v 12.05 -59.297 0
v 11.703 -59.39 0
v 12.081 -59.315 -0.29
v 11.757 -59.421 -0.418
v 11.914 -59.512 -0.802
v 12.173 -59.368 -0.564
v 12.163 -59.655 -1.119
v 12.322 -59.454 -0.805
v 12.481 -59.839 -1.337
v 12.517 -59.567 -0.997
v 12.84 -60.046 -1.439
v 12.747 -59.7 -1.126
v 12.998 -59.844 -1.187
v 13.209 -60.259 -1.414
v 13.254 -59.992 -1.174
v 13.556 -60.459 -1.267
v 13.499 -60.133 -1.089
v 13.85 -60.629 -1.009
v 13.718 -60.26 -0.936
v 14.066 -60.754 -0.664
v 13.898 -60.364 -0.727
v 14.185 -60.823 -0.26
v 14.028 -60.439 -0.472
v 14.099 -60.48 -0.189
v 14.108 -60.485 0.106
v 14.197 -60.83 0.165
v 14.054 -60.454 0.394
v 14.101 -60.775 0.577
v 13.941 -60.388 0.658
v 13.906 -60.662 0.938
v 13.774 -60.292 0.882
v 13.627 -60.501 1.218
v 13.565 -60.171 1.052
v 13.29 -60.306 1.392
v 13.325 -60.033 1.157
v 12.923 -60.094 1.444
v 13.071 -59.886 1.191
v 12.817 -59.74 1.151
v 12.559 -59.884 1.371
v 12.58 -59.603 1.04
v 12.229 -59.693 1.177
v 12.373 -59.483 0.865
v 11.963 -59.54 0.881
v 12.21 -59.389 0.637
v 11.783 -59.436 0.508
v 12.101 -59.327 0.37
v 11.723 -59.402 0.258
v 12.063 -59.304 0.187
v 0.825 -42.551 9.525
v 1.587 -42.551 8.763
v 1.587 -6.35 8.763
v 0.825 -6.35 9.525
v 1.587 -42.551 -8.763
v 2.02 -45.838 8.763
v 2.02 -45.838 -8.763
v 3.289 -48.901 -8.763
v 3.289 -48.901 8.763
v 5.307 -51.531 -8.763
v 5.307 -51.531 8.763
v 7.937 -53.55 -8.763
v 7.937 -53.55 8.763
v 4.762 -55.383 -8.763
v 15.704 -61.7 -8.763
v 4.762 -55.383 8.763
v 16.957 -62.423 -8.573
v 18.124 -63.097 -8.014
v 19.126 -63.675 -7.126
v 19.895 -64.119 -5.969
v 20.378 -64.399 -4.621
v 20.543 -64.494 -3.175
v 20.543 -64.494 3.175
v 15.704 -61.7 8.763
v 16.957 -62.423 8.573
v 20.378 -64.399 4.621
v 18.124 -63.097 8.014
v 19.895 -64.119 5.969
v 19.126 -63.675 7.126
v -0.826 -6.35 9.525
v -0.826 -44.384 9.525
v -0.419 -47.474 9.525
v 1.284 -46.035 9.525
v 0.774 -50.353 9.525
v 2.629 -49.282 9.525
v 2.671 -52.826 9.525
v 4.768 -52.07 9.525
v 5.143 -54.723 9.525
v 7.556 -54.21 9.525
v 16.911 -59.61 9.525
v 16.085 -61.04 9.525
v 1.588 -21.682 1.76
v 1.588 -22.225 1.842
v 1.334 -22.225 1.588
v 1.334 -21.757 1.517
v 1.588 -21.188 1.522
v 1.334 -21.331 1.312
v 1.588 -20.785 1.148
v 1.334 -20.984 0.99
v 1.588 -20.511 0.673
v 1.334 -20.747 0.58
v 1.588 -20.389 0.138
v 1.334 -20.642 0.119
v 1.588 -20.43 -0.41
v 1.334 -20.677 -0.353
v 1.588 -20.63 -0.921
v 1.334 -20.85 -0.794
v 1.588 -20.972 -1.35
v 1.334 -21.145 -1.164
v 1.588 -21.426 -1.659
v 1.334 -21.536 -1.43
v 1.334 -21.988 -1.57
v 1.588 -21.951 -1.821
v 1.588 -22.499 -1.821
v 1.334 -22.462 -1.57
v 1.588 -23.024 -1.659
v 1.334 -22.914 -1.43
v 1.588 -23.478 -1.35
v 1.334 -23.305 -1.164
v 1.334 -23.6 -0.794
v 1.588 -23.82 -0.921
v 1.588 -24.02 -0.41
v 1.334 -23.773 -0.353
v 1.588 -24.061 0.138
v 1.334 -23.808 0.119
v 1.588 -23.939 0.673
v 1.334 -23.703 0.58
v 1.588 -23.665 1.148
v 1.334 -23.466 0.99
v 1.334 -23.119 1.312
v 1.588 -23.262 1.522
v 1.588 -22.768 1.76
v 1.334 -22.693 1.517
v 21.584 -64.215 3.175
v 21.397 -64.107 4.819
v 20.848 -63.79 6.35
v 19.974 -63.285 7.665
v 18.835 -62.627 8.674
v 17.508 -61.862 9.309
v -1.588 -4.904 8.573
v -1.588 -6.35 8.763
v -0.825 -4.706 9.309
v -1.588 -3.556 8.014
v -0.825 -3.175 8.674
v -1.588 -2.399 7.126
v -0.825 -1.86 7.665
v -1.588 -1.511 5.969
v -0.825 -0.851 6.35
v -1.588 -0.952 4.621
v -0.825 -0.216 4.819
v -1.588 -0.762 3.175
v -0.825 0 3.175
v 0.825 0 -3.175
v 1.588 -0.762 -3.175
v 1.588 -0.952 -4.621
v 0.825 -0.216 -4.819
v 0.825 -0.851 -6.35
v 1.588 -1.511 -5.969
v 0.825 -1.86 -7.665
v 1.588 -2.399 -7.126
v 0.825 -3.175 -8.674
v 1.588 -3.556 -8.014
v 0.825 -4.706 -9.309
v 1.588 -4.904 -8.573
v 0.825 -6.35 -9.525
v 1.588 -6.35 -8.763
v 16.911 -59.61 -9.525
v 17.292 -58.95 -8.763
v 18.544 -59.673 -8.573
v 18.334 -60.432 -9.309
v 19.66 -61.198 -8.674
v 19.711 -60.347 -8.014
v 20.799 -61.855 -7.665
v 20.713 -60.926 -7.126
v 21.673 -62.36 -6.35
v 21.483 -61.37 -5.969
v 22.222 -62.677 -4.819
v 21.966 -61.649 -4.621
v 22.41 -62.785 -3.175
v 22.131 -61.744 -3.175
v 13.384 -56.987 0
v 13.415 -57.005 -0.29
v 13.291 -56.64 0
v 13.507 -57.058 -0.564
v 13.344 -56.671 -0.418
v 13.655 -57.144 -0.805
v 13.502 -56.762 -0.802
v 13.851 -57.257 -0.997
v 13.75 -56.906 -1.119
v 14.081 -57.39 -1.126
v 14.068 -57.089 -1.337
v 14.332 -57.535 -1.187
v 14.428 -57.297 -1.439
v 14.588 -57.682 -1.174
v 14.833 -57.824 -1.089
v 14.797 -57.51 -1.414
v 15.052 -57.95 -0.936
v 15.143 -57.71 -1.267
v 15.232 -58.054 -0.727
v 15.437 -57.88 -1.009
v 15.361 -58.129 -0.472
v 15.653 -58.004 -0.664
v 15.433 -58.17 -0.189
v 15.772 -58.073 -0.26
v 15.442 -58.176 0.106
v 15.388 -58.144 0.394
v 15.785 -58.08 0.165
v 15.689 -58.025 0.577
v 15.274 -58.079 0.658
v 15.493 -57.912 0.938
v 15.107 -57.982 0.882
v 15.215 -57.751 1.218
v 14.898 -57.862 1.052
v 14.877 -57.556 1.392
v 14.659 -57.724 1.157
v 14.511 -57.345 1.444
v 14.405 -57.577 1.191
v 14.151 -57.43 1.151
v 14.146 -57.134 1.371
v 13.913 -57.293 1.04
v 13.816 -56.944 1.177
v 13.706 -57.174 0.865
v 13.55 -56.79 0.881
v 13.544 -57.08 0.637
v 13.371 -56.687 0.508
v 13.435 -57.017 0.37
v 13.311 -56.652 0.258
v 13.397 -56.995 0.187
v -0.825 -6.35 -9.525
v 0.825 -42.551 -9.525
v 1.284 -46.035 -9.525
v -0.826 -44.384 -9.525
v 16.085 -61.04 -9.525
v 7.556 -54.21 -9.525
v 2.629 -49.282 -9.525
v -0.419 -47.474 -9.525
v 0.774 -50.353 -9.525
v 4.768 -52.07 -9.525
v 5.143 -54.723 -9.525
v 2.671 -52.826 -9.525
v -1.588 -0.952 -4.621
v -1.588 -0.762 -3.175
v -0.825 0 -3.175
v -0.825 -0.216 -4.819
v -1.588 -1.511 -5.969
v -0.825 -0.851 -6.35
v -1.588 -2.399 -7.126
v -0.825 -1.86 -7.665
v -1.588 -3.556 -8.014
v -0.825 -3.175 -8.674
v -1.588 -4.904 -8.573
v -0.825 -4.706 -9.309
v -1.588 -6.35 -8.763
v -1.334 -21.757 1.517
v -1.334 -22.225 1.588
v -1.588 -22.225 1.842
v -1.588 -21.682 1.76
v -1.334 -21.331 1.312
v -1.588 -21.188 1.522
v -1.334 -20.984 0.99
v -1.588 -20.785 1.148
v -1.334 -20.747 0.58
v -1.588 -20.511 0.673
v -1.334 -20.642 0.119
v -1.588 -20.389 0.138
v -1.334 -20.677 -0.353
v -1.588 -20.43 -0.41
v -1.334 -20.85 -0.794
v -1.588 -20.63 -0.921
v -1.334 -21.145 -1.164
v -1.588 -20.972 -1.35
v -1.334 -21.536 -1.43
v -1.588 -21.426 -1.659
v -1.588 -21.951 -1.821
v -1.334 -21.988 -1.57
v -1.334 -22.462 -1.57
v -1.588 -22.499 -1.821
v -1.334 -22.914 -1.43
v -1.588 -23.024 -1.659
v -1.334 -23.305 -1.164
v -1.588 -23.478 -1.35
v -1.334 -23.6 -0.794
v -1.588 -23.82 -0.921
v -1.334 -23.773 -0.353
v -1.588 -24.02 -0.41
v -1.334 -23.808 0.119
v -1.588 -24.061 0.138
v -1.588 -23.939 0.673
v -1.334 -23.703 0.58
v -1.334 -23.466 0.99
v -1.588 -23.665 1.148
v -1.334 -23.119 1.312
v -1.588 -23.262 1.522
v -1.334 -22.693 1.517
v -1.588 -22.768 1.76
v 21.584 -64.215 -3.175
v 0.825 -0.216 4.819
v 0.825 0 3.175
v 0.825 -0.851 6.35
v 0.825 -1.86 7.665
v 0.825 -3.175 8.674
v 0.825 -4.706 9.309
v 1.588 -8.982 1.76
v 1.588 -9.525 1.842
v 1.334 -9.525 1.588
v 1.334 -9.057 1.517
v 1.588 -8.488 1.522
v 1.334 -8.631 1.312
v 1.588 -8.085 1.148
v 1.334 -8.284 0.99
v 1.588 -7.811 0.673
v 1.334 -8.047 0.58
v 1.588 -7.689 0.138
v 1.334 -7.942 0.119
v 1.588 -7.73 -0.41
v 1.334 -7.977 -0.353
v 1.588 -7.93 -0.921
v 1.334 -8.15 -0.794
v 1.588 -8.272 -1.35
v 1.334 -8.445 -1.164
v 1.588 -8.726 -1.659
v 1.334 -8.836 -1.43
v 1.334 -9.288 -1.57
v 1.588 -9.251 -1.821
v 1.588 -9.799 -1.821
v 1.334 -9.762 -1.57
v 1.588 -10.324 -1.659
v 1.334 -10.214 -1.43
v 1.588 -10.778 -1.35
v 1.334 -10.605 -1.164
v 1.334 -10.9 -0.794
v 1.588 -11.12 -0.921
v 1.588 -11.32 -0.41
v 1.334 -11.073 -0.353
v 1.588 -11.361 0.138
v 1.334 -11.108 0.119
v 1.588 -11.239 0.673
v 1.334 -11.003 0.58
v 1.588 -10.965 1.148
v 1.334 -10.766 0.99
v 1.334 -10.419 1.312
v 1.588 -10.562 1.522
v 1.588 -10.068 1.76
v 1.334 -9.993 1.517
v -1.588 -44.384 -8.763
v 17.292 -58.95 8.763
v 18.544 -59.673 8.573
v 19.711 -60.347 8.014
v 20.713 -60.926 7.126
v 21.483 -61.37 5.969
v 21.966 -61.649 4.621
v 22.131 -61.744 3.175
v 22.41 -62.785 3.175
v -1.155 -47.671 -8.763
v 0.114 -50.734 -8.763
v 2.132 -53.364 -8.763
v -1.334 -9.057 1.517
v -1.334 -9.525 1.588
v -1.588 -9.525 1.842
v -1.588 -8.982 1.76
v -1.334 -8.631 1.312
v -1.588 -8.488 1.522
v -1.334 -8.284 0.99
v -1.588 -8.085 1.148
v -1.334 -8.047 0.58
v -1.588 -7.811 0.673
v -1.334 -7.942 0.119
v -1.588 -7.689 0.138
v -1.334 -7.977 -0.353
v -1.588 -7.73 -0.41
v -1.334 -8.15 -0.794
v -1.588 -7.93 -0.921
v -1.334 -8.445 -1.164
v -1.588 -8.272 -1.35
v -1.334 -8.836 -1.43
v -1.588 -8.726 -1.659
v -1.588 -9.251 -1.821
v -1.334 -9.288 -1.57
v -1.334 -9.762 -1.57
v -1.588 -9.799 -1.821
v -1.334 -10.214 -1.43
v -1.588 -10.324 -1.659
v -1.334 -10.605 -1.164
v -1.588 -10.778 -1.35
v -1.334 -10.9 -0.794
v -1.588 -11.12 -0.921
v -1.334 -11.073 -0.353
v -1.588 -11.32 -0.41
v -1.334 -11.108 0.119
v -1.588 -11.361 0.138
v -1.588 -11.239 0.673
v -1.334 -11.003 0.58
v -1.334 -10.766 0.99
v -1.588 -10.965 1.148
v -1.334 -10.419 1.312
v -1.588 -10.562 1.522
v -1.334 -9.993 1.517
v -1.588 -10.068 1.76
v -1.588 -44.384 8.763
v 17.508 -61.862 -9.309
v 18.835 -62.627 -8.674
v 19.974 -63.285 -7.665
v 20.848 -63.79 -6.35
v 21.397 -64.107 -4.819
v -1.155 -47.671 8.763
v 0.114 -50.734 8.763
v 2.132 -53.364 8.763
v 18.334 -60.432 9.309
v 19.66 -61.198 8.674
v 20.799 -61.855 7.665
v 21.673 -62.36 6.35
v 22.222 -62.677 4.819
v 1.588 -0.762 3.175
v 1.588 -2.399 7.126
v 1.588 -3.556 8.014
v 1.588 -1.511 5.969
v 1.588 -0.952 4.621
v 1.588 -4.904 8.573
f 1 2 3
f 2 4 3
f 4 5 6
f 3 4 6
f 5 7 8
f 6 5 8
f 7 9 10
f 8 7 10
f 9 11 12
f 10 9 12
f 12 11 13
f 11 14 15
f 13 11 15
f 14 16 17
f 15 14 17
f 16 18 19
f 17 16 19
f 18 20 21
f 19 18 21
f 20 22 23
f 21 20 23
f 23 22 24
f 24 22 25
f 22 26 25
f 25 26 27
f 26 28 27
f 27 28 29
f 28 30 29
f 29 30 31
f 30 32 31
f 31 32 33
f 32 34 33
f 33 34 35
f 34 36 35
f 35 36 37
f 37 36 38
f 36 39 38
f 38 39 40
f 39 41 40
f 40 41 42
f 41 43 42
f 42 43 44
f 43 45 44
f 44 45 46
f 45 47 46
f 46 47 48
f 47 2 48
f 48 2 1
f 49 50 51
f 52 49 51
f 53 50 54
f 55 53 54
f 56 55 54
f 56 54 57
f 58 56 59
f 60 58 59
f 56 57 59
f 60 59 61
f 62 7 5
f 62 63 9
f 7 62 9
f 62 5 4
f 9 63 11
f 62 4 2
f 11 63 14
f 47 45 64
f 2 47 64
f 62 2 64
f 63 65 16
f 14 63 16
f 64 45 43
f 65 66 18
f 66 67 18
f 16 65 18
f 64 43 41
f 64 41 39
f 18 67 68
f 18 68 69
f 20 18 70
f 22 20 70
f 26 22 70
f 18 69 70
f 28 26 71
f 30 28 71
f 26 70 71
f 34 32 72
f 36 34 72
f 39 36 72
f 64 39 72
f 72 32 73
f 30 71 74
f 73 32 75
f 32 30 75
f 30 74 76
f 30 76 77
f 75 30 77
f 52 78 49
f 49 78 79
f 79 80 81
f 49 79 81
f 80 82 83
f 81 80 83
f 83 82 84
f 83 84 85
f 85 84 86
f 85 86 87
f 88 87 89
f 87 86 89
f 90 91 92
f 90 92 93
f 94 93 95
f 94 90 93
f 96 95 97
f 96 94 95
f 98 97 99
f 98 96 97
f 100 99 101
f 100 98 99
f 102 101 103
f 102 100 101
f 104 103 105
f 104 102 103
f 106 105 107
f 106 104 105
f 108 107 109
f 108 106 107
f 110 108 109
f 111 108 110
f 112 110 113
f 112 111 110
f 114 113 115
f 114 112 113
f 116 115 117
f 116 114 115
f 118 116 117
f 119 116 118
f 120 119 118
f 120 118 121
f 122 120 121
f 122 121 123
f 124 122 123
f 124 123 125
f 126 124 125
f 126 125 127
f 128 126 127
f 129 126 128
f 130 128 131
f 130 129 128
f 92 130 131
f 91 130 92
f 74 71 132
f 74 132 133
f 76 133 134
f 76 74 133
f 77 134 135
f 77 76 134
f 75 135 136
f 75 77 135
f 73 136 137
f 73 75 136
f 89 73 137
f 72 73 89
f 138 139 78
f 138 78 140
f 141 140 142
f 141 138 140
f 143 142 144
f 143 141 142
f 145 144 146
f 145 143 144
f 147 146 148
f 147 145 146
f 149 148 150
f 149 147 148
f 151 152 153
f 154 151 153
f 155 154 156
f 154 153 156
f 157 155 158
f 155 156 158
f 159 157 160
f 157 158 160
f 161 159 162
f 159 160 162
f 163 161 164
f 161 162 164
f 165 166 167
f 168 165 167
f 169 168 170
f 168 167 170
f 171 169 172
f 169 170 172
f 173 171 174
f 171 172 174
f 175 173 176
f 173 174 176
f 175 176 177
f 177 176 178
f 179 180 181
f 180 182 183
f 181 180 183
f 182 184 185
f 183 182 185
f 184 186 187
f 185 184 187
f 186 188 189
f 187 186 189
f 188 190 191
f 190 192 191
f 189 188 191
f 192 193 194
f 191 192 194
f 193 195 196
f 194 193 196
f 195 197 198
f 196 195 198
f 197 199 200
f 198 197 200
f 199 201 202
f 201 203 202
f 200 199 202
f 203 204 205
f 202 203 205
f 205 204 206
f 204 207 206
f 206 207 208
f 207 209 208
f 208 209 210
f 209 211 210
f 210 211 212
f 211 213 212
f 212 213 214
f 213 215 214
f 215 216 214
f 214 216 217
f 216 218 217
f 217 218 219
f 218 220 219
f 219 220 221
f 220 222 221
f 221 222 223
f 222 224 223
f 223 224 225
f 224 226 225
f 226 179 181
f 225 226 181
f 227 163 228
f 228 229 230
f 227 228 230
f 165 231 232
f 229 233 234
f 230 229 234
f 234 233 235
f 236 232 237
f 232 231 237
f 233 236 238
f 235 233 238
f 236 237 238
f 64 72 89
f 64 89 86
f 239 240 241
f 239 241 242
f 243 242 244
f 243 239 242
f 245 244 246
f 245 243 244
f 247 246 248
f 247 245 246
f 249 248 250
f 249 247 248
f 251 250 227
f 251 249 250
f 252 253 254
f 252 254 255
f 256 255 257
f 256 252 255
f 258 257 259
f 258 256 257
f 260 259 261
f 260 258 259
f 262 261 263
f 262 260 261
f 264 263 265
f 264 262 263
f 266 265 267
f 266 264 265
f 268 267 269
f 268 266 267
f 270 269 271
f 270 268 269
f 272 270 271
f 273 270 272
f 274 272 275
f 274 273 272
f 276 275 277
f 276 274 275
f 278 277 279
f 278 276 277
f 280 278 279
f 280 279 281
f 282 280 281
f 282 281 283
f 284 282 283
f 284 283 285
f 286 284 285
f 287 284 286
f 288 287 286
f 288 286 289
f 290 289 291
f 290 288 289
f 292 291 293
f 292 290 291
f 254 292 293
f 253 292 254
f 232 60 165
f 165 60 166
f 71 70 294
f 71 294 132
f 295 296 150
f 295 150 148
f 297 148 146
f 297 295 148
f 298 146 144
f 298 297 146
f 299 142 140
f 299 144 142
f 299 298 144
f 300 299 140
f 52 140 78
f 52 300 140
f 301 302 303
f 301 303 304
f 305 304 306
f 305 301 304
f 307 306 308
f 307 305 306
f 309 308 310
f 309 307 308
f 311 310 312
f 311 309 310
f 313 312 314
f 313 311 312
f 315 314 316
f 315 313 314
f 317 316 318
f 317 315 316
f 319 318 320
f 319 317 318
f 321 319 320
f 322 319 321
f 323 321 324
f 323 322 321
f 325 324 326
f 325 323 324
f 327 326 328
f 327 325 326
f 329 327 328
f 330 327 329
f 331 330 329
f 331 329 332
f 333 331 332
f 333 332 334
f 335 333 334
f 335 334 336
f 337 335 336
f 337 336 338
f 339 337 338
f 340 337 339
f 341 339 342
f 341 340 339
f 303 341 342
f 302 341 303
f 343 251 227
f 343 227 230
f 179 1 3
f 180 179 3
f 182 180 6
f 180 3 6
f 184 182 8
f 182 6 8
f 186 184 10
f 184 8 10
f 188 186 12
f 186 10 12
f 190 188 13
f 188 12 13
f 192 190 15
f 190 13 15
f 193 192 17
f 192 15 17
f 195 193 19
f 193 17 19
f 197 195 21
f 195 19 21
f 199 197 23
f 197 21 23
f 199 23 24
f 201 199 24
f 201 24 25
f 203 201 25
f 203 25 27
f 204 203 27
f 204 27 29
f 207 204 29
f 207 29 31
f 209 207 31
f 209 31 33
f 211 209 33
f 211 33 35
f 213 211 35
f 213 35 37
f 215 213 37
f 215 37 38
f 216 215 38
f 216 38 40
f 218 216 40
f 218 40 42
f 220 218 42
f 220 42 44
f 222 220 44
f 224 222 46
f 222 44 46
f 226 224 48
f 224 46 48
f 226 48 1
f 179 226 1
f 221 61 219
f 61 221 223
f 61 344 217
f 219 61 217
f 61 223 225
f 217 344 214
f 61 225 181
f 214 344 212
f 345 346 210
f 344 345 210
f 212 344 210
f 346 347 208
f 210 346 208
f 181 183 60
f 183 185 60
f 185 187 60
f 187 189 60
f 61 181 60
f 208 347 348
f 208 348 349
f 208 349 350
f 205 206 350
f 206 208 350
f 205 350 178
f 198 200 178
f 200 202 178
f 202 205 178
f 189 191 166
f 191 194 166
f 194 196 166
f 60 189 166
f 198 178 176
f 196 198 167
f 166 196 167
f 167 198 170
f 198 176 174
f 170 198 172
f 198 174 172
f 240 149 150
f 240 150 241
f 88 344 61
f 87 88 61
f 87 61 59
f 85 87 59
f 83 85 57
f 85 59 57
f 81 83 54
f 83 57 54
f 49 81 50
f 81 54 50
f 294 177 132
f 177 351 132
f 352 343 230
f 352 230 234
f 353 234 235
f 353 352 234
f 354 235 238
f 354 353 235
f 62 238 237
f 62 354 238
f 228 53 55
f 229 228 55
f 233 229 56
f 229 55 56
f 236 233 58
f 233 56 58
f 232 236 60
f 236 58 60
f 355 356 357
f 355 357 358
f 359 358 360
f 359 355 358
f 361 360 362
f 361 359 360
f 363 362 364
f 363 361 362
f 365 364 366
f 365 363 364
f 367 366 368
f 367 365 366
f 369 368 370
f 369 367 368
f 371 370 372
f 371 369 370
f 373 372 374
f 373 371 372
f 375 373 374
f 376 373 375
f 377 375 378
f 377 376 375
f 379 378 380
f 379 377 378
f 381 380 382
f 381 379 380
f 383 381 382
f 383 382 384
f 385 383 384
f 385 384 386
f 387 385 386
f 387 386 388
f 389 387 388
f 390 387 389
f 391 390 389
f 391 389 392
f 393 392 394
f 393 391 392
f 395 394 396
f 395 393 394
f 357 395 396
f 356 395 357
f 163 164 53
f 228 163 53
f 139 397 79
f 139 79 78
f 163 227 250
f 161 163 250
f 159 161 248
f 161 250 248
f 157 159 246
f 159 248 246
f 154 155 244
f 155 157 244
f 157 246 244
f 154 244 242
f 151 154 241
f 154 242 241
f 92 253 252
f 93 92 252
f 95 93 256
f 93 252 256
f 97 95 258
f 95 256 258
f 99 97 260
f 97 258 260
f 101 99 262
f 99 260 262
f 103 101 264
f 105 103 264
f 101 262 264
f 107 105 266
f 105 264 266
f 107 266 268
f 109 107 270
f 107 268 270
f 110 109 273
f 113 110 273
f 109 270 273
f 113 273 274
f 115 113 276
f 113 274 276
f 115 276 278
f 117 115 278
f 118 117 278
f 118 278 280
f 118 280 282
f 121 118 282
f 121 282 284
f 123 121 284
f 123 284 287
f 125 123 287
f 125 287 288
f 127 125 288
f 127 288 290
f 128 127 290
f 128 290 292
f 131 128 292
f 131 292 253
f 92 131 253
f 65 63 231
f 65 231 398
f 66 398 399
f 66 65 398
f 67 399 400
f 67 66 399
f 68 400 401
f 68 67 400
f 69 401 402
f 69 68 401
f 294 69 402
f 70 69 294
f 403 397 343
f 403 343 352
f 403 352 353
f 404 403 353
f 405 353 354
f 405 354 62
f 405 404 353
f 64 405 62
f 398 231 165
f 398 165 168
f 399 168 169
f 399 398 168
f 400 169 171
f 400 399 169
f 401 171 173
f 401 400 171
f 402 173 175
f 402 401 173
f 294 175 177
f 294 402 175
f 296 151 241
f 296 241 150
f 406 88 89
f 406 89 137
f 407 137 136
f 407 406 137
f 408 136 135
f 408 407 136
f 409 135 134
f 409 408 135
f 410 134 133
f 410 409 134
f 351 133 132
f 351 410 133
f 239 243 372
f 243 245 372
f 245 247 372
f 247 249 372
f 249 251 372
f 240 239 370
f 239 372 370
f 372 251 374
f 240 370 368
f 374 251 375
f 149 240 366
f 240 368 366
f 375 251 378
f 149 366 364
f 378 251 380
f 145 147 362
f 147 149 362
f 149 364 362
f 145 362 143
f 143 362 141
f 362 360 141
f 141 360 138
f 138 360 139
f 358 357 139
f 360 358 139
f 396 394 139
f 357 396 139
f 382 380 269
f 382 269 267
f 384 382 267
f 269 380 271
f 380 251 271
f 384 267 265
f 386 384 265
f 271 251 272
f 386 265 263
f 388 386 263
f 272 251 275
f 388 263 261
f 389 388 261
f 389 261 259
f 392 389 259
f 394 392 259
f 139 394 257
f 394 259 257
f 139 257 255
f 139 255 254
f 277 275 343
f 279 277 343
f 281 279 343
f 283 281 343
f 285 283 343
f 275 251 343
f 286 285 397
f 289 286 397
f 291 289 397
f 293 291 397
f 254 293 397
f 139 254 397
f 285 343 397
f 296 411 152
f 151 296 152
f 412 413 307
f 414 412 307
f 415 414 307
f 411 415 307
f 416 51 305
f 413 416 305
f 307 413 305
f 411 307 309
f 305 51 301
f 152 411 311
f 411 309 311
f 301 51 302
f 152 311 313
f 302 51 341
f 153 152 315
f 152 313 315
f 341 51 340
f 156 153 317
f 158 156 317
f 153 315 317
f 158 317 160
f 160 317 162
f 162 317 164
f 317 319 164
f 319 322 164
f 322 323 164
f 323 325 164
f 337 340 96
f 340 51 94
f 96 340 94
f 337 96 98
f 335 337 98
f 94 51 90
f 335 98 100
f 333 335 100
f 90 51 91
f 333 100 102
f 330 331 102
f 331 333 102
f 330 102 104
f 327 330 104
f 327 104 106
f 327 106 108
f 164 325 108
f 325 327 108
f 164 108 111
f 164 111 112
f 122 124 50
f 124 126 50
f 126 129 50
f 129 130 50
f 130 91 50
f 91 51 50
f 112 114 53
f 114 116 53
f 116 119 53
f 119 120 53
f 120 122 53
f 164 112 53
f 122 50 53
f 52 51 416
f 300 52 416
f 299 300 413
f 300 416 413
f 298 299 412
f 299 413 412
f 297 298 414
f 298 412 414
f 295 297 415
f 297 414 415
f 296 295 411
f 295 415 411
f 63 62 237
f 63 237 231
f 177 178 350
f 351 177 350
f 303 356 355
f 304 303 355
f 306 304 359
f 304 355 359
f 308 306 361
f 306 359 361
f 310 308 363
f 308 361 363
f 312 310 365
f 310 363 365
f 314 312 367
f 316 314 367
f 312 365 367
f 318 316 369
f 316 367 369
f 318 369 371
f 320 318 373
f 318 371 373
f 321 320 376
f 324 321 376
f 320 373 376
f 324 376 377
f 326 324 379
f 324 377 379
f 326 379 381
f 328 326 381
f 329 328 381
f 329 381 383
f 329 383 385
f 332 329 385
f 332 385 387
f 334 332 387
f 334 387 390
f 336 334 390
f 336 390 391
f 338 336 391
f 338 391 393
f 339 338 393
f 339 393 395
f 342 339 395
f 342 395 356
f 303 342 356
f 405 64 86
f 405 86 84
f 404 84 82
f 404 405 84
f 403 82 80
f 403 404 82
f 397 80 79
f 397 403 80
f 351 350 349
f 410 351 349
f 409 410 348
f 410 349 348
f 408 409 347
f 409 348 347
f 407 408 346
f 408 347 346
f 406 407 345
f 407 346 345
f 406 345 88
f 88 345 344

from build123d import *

# Parameters (mm, degrees)
SKETCH2_W                       = 3.175
SKETCH2_H                       = 19.05
F_1_8_0_125_DIAMETER_HOLE1_D    = 3.175
F_3_32_0_09375_DIAMETER_HOLE2_D = 2.38125
FILLET1_R                       = 12.7
FILLET2_R                       = 6.35
CHAMFER3_SIZE                   = 0.762
CHAMFER2_SIZE                   = 0.254


with BuildPart() as part:
    # Sweep1: sweep along a path in Sketch1
    with BuildLine(Plane.XY) as sweep1_path:
        Line((0, 0), (0, -31.75))
        Line((0, -31.75), (0, -50.8))
        Line((0, -50.8), (21.997045256, -63.5))
    # Sketch2 → Sweep1 (sweep)
    with BuildSketch(Plane(origin=(0, 0, 0), x_dir=(1, 0, 0), z_dir=(0, 1, 0))):
        Rectangle(SKETCH2_W, SKETCH2_H)
    sweep(path=sweep1_path.line, transition=Transition.RIGHT)

    # 1/8 (0.125) Diameter Hole1 (through all)
    with Locations(Plane(origin=(1.5875, 0, 0), x_dir=(0, 0, -1), z_dir=(1, 0, 0))):
        with Locations((0, -9.525), (0, -22.225)):
            Hole(F_1_8_0_125_DIAMETER_HOLE1_D / 2)

    # 3/32 (0.09375) Diameter Hole2 (through all)
    with Locations(Plane(origin=(-21.203295256, -36.725184671, 0), x_dir=(0.866025404, -0.5, 0), z_dir=(0.5, 0.866025404, 0))):
        with Locations((41.275, 0)):
            Hole(F_3_32_0_09375_DIAMETER_HOLE2_D / 2)

    # Fillet1
    fillet1_edges = [part.edges().sort_by_distance(p)[0] for p in [
        (1.5875, -49.883456448, 0),
        (-1.5875, -51.716543552, 0),
    ]]
    fillet(fillet1_edges, radius=FILLET1_R)

    # Fillet2
    fillet2_edges = [part.edges().sort_by_distance(p)[0] for p in [
        (21.997045256, -63.5, -9.525),
        (21.997045256, -63.5, 9.525),
        (0, 0, -9.525),
        (0, 0, 9.525),
    ]]
    fillet(fillet2_edges, radius=FILLET2_R)

    # Chamfer3
    chamfer3_edges = [part.edges().sort_by_distance(p)[0] for p in [
        (10.233266971, -58.541266545, -9.525),
        (10.233266971, -58.541266545, 9.525),
        (12.614516971, -56.249907664, -9.525),
        (0.113977372, -50.734195134, -9.525),
        (0.113977372, -50.734195134, -9.525),
        (0.113977372, -50.734195134, 9.525),
        (12.614516971, -56.249907664, 9.525),
        (0.113977372, -50.734195134, 9.525),
        (3.288977372, -48.901108029, 9.525),
        (3.288977372, -48.901108029, 9.525),
        (3.288977372, -48.901108029, -9.525),
        (3.288977372, -48.901108029, -9.525),
        (1.5875, -24.450554014, 9.525),
        (1.5875, -24.450554014, -9.525),
        (-1.5875, -25.367097567, -9.525),
        (-1.5875, -25.367097567, 9.525),
        (21.203295256, -64.874815329, 0),
        (19.592598909, -63.944879359, 7.665128061),
        (19.592598909, -63.944879359, -7.665128061),
        (22.790795256, -62.125184671, 0),
        (21.180098909, -61.195248702, 7.665128061),
        (21.180098909, -61.195248702, -7.665128061),
        (1.5875, 0, 0),
        (-1.5875, 0, 0),
        (-1.5875, -25.367097567, 9.525),
        (-1.5875, -25.367097567, -9.525),
        (-1.5875, -1.859871939, 7.665128061),
        (-1.5875, -1.859871939, -7.665128061),
        (1.5875, -24.450554014, -9.525),
        (1.5875, -24.450554014, 9.525),
        (1.5875, -1.859871939, 7.665128061),
        (1.5875, -1.859871939, -7.665128061),
    ]]
    chamfer(chamfer3_edges, length=CHAMFER3_SIZE)

    # Chamfer2
    chamfer2_edges = [part.edges().sort_by_distance(p)[0] for p in [
        (1.5875, -22.225, -1.5875),
        (-1.5875, -22.225, -1.5875),
        (1.5875, -9.525, -1.5875),
        (-1.5875, -9.525, -1.5875),
        (13.985514781, -60.707627829, 0),
        (15.573014781, -57.957997171, 0),
    ]]
    chamfer(chamfer2_edges, length=CHAMFER2_SIZE)


solid = part.part
